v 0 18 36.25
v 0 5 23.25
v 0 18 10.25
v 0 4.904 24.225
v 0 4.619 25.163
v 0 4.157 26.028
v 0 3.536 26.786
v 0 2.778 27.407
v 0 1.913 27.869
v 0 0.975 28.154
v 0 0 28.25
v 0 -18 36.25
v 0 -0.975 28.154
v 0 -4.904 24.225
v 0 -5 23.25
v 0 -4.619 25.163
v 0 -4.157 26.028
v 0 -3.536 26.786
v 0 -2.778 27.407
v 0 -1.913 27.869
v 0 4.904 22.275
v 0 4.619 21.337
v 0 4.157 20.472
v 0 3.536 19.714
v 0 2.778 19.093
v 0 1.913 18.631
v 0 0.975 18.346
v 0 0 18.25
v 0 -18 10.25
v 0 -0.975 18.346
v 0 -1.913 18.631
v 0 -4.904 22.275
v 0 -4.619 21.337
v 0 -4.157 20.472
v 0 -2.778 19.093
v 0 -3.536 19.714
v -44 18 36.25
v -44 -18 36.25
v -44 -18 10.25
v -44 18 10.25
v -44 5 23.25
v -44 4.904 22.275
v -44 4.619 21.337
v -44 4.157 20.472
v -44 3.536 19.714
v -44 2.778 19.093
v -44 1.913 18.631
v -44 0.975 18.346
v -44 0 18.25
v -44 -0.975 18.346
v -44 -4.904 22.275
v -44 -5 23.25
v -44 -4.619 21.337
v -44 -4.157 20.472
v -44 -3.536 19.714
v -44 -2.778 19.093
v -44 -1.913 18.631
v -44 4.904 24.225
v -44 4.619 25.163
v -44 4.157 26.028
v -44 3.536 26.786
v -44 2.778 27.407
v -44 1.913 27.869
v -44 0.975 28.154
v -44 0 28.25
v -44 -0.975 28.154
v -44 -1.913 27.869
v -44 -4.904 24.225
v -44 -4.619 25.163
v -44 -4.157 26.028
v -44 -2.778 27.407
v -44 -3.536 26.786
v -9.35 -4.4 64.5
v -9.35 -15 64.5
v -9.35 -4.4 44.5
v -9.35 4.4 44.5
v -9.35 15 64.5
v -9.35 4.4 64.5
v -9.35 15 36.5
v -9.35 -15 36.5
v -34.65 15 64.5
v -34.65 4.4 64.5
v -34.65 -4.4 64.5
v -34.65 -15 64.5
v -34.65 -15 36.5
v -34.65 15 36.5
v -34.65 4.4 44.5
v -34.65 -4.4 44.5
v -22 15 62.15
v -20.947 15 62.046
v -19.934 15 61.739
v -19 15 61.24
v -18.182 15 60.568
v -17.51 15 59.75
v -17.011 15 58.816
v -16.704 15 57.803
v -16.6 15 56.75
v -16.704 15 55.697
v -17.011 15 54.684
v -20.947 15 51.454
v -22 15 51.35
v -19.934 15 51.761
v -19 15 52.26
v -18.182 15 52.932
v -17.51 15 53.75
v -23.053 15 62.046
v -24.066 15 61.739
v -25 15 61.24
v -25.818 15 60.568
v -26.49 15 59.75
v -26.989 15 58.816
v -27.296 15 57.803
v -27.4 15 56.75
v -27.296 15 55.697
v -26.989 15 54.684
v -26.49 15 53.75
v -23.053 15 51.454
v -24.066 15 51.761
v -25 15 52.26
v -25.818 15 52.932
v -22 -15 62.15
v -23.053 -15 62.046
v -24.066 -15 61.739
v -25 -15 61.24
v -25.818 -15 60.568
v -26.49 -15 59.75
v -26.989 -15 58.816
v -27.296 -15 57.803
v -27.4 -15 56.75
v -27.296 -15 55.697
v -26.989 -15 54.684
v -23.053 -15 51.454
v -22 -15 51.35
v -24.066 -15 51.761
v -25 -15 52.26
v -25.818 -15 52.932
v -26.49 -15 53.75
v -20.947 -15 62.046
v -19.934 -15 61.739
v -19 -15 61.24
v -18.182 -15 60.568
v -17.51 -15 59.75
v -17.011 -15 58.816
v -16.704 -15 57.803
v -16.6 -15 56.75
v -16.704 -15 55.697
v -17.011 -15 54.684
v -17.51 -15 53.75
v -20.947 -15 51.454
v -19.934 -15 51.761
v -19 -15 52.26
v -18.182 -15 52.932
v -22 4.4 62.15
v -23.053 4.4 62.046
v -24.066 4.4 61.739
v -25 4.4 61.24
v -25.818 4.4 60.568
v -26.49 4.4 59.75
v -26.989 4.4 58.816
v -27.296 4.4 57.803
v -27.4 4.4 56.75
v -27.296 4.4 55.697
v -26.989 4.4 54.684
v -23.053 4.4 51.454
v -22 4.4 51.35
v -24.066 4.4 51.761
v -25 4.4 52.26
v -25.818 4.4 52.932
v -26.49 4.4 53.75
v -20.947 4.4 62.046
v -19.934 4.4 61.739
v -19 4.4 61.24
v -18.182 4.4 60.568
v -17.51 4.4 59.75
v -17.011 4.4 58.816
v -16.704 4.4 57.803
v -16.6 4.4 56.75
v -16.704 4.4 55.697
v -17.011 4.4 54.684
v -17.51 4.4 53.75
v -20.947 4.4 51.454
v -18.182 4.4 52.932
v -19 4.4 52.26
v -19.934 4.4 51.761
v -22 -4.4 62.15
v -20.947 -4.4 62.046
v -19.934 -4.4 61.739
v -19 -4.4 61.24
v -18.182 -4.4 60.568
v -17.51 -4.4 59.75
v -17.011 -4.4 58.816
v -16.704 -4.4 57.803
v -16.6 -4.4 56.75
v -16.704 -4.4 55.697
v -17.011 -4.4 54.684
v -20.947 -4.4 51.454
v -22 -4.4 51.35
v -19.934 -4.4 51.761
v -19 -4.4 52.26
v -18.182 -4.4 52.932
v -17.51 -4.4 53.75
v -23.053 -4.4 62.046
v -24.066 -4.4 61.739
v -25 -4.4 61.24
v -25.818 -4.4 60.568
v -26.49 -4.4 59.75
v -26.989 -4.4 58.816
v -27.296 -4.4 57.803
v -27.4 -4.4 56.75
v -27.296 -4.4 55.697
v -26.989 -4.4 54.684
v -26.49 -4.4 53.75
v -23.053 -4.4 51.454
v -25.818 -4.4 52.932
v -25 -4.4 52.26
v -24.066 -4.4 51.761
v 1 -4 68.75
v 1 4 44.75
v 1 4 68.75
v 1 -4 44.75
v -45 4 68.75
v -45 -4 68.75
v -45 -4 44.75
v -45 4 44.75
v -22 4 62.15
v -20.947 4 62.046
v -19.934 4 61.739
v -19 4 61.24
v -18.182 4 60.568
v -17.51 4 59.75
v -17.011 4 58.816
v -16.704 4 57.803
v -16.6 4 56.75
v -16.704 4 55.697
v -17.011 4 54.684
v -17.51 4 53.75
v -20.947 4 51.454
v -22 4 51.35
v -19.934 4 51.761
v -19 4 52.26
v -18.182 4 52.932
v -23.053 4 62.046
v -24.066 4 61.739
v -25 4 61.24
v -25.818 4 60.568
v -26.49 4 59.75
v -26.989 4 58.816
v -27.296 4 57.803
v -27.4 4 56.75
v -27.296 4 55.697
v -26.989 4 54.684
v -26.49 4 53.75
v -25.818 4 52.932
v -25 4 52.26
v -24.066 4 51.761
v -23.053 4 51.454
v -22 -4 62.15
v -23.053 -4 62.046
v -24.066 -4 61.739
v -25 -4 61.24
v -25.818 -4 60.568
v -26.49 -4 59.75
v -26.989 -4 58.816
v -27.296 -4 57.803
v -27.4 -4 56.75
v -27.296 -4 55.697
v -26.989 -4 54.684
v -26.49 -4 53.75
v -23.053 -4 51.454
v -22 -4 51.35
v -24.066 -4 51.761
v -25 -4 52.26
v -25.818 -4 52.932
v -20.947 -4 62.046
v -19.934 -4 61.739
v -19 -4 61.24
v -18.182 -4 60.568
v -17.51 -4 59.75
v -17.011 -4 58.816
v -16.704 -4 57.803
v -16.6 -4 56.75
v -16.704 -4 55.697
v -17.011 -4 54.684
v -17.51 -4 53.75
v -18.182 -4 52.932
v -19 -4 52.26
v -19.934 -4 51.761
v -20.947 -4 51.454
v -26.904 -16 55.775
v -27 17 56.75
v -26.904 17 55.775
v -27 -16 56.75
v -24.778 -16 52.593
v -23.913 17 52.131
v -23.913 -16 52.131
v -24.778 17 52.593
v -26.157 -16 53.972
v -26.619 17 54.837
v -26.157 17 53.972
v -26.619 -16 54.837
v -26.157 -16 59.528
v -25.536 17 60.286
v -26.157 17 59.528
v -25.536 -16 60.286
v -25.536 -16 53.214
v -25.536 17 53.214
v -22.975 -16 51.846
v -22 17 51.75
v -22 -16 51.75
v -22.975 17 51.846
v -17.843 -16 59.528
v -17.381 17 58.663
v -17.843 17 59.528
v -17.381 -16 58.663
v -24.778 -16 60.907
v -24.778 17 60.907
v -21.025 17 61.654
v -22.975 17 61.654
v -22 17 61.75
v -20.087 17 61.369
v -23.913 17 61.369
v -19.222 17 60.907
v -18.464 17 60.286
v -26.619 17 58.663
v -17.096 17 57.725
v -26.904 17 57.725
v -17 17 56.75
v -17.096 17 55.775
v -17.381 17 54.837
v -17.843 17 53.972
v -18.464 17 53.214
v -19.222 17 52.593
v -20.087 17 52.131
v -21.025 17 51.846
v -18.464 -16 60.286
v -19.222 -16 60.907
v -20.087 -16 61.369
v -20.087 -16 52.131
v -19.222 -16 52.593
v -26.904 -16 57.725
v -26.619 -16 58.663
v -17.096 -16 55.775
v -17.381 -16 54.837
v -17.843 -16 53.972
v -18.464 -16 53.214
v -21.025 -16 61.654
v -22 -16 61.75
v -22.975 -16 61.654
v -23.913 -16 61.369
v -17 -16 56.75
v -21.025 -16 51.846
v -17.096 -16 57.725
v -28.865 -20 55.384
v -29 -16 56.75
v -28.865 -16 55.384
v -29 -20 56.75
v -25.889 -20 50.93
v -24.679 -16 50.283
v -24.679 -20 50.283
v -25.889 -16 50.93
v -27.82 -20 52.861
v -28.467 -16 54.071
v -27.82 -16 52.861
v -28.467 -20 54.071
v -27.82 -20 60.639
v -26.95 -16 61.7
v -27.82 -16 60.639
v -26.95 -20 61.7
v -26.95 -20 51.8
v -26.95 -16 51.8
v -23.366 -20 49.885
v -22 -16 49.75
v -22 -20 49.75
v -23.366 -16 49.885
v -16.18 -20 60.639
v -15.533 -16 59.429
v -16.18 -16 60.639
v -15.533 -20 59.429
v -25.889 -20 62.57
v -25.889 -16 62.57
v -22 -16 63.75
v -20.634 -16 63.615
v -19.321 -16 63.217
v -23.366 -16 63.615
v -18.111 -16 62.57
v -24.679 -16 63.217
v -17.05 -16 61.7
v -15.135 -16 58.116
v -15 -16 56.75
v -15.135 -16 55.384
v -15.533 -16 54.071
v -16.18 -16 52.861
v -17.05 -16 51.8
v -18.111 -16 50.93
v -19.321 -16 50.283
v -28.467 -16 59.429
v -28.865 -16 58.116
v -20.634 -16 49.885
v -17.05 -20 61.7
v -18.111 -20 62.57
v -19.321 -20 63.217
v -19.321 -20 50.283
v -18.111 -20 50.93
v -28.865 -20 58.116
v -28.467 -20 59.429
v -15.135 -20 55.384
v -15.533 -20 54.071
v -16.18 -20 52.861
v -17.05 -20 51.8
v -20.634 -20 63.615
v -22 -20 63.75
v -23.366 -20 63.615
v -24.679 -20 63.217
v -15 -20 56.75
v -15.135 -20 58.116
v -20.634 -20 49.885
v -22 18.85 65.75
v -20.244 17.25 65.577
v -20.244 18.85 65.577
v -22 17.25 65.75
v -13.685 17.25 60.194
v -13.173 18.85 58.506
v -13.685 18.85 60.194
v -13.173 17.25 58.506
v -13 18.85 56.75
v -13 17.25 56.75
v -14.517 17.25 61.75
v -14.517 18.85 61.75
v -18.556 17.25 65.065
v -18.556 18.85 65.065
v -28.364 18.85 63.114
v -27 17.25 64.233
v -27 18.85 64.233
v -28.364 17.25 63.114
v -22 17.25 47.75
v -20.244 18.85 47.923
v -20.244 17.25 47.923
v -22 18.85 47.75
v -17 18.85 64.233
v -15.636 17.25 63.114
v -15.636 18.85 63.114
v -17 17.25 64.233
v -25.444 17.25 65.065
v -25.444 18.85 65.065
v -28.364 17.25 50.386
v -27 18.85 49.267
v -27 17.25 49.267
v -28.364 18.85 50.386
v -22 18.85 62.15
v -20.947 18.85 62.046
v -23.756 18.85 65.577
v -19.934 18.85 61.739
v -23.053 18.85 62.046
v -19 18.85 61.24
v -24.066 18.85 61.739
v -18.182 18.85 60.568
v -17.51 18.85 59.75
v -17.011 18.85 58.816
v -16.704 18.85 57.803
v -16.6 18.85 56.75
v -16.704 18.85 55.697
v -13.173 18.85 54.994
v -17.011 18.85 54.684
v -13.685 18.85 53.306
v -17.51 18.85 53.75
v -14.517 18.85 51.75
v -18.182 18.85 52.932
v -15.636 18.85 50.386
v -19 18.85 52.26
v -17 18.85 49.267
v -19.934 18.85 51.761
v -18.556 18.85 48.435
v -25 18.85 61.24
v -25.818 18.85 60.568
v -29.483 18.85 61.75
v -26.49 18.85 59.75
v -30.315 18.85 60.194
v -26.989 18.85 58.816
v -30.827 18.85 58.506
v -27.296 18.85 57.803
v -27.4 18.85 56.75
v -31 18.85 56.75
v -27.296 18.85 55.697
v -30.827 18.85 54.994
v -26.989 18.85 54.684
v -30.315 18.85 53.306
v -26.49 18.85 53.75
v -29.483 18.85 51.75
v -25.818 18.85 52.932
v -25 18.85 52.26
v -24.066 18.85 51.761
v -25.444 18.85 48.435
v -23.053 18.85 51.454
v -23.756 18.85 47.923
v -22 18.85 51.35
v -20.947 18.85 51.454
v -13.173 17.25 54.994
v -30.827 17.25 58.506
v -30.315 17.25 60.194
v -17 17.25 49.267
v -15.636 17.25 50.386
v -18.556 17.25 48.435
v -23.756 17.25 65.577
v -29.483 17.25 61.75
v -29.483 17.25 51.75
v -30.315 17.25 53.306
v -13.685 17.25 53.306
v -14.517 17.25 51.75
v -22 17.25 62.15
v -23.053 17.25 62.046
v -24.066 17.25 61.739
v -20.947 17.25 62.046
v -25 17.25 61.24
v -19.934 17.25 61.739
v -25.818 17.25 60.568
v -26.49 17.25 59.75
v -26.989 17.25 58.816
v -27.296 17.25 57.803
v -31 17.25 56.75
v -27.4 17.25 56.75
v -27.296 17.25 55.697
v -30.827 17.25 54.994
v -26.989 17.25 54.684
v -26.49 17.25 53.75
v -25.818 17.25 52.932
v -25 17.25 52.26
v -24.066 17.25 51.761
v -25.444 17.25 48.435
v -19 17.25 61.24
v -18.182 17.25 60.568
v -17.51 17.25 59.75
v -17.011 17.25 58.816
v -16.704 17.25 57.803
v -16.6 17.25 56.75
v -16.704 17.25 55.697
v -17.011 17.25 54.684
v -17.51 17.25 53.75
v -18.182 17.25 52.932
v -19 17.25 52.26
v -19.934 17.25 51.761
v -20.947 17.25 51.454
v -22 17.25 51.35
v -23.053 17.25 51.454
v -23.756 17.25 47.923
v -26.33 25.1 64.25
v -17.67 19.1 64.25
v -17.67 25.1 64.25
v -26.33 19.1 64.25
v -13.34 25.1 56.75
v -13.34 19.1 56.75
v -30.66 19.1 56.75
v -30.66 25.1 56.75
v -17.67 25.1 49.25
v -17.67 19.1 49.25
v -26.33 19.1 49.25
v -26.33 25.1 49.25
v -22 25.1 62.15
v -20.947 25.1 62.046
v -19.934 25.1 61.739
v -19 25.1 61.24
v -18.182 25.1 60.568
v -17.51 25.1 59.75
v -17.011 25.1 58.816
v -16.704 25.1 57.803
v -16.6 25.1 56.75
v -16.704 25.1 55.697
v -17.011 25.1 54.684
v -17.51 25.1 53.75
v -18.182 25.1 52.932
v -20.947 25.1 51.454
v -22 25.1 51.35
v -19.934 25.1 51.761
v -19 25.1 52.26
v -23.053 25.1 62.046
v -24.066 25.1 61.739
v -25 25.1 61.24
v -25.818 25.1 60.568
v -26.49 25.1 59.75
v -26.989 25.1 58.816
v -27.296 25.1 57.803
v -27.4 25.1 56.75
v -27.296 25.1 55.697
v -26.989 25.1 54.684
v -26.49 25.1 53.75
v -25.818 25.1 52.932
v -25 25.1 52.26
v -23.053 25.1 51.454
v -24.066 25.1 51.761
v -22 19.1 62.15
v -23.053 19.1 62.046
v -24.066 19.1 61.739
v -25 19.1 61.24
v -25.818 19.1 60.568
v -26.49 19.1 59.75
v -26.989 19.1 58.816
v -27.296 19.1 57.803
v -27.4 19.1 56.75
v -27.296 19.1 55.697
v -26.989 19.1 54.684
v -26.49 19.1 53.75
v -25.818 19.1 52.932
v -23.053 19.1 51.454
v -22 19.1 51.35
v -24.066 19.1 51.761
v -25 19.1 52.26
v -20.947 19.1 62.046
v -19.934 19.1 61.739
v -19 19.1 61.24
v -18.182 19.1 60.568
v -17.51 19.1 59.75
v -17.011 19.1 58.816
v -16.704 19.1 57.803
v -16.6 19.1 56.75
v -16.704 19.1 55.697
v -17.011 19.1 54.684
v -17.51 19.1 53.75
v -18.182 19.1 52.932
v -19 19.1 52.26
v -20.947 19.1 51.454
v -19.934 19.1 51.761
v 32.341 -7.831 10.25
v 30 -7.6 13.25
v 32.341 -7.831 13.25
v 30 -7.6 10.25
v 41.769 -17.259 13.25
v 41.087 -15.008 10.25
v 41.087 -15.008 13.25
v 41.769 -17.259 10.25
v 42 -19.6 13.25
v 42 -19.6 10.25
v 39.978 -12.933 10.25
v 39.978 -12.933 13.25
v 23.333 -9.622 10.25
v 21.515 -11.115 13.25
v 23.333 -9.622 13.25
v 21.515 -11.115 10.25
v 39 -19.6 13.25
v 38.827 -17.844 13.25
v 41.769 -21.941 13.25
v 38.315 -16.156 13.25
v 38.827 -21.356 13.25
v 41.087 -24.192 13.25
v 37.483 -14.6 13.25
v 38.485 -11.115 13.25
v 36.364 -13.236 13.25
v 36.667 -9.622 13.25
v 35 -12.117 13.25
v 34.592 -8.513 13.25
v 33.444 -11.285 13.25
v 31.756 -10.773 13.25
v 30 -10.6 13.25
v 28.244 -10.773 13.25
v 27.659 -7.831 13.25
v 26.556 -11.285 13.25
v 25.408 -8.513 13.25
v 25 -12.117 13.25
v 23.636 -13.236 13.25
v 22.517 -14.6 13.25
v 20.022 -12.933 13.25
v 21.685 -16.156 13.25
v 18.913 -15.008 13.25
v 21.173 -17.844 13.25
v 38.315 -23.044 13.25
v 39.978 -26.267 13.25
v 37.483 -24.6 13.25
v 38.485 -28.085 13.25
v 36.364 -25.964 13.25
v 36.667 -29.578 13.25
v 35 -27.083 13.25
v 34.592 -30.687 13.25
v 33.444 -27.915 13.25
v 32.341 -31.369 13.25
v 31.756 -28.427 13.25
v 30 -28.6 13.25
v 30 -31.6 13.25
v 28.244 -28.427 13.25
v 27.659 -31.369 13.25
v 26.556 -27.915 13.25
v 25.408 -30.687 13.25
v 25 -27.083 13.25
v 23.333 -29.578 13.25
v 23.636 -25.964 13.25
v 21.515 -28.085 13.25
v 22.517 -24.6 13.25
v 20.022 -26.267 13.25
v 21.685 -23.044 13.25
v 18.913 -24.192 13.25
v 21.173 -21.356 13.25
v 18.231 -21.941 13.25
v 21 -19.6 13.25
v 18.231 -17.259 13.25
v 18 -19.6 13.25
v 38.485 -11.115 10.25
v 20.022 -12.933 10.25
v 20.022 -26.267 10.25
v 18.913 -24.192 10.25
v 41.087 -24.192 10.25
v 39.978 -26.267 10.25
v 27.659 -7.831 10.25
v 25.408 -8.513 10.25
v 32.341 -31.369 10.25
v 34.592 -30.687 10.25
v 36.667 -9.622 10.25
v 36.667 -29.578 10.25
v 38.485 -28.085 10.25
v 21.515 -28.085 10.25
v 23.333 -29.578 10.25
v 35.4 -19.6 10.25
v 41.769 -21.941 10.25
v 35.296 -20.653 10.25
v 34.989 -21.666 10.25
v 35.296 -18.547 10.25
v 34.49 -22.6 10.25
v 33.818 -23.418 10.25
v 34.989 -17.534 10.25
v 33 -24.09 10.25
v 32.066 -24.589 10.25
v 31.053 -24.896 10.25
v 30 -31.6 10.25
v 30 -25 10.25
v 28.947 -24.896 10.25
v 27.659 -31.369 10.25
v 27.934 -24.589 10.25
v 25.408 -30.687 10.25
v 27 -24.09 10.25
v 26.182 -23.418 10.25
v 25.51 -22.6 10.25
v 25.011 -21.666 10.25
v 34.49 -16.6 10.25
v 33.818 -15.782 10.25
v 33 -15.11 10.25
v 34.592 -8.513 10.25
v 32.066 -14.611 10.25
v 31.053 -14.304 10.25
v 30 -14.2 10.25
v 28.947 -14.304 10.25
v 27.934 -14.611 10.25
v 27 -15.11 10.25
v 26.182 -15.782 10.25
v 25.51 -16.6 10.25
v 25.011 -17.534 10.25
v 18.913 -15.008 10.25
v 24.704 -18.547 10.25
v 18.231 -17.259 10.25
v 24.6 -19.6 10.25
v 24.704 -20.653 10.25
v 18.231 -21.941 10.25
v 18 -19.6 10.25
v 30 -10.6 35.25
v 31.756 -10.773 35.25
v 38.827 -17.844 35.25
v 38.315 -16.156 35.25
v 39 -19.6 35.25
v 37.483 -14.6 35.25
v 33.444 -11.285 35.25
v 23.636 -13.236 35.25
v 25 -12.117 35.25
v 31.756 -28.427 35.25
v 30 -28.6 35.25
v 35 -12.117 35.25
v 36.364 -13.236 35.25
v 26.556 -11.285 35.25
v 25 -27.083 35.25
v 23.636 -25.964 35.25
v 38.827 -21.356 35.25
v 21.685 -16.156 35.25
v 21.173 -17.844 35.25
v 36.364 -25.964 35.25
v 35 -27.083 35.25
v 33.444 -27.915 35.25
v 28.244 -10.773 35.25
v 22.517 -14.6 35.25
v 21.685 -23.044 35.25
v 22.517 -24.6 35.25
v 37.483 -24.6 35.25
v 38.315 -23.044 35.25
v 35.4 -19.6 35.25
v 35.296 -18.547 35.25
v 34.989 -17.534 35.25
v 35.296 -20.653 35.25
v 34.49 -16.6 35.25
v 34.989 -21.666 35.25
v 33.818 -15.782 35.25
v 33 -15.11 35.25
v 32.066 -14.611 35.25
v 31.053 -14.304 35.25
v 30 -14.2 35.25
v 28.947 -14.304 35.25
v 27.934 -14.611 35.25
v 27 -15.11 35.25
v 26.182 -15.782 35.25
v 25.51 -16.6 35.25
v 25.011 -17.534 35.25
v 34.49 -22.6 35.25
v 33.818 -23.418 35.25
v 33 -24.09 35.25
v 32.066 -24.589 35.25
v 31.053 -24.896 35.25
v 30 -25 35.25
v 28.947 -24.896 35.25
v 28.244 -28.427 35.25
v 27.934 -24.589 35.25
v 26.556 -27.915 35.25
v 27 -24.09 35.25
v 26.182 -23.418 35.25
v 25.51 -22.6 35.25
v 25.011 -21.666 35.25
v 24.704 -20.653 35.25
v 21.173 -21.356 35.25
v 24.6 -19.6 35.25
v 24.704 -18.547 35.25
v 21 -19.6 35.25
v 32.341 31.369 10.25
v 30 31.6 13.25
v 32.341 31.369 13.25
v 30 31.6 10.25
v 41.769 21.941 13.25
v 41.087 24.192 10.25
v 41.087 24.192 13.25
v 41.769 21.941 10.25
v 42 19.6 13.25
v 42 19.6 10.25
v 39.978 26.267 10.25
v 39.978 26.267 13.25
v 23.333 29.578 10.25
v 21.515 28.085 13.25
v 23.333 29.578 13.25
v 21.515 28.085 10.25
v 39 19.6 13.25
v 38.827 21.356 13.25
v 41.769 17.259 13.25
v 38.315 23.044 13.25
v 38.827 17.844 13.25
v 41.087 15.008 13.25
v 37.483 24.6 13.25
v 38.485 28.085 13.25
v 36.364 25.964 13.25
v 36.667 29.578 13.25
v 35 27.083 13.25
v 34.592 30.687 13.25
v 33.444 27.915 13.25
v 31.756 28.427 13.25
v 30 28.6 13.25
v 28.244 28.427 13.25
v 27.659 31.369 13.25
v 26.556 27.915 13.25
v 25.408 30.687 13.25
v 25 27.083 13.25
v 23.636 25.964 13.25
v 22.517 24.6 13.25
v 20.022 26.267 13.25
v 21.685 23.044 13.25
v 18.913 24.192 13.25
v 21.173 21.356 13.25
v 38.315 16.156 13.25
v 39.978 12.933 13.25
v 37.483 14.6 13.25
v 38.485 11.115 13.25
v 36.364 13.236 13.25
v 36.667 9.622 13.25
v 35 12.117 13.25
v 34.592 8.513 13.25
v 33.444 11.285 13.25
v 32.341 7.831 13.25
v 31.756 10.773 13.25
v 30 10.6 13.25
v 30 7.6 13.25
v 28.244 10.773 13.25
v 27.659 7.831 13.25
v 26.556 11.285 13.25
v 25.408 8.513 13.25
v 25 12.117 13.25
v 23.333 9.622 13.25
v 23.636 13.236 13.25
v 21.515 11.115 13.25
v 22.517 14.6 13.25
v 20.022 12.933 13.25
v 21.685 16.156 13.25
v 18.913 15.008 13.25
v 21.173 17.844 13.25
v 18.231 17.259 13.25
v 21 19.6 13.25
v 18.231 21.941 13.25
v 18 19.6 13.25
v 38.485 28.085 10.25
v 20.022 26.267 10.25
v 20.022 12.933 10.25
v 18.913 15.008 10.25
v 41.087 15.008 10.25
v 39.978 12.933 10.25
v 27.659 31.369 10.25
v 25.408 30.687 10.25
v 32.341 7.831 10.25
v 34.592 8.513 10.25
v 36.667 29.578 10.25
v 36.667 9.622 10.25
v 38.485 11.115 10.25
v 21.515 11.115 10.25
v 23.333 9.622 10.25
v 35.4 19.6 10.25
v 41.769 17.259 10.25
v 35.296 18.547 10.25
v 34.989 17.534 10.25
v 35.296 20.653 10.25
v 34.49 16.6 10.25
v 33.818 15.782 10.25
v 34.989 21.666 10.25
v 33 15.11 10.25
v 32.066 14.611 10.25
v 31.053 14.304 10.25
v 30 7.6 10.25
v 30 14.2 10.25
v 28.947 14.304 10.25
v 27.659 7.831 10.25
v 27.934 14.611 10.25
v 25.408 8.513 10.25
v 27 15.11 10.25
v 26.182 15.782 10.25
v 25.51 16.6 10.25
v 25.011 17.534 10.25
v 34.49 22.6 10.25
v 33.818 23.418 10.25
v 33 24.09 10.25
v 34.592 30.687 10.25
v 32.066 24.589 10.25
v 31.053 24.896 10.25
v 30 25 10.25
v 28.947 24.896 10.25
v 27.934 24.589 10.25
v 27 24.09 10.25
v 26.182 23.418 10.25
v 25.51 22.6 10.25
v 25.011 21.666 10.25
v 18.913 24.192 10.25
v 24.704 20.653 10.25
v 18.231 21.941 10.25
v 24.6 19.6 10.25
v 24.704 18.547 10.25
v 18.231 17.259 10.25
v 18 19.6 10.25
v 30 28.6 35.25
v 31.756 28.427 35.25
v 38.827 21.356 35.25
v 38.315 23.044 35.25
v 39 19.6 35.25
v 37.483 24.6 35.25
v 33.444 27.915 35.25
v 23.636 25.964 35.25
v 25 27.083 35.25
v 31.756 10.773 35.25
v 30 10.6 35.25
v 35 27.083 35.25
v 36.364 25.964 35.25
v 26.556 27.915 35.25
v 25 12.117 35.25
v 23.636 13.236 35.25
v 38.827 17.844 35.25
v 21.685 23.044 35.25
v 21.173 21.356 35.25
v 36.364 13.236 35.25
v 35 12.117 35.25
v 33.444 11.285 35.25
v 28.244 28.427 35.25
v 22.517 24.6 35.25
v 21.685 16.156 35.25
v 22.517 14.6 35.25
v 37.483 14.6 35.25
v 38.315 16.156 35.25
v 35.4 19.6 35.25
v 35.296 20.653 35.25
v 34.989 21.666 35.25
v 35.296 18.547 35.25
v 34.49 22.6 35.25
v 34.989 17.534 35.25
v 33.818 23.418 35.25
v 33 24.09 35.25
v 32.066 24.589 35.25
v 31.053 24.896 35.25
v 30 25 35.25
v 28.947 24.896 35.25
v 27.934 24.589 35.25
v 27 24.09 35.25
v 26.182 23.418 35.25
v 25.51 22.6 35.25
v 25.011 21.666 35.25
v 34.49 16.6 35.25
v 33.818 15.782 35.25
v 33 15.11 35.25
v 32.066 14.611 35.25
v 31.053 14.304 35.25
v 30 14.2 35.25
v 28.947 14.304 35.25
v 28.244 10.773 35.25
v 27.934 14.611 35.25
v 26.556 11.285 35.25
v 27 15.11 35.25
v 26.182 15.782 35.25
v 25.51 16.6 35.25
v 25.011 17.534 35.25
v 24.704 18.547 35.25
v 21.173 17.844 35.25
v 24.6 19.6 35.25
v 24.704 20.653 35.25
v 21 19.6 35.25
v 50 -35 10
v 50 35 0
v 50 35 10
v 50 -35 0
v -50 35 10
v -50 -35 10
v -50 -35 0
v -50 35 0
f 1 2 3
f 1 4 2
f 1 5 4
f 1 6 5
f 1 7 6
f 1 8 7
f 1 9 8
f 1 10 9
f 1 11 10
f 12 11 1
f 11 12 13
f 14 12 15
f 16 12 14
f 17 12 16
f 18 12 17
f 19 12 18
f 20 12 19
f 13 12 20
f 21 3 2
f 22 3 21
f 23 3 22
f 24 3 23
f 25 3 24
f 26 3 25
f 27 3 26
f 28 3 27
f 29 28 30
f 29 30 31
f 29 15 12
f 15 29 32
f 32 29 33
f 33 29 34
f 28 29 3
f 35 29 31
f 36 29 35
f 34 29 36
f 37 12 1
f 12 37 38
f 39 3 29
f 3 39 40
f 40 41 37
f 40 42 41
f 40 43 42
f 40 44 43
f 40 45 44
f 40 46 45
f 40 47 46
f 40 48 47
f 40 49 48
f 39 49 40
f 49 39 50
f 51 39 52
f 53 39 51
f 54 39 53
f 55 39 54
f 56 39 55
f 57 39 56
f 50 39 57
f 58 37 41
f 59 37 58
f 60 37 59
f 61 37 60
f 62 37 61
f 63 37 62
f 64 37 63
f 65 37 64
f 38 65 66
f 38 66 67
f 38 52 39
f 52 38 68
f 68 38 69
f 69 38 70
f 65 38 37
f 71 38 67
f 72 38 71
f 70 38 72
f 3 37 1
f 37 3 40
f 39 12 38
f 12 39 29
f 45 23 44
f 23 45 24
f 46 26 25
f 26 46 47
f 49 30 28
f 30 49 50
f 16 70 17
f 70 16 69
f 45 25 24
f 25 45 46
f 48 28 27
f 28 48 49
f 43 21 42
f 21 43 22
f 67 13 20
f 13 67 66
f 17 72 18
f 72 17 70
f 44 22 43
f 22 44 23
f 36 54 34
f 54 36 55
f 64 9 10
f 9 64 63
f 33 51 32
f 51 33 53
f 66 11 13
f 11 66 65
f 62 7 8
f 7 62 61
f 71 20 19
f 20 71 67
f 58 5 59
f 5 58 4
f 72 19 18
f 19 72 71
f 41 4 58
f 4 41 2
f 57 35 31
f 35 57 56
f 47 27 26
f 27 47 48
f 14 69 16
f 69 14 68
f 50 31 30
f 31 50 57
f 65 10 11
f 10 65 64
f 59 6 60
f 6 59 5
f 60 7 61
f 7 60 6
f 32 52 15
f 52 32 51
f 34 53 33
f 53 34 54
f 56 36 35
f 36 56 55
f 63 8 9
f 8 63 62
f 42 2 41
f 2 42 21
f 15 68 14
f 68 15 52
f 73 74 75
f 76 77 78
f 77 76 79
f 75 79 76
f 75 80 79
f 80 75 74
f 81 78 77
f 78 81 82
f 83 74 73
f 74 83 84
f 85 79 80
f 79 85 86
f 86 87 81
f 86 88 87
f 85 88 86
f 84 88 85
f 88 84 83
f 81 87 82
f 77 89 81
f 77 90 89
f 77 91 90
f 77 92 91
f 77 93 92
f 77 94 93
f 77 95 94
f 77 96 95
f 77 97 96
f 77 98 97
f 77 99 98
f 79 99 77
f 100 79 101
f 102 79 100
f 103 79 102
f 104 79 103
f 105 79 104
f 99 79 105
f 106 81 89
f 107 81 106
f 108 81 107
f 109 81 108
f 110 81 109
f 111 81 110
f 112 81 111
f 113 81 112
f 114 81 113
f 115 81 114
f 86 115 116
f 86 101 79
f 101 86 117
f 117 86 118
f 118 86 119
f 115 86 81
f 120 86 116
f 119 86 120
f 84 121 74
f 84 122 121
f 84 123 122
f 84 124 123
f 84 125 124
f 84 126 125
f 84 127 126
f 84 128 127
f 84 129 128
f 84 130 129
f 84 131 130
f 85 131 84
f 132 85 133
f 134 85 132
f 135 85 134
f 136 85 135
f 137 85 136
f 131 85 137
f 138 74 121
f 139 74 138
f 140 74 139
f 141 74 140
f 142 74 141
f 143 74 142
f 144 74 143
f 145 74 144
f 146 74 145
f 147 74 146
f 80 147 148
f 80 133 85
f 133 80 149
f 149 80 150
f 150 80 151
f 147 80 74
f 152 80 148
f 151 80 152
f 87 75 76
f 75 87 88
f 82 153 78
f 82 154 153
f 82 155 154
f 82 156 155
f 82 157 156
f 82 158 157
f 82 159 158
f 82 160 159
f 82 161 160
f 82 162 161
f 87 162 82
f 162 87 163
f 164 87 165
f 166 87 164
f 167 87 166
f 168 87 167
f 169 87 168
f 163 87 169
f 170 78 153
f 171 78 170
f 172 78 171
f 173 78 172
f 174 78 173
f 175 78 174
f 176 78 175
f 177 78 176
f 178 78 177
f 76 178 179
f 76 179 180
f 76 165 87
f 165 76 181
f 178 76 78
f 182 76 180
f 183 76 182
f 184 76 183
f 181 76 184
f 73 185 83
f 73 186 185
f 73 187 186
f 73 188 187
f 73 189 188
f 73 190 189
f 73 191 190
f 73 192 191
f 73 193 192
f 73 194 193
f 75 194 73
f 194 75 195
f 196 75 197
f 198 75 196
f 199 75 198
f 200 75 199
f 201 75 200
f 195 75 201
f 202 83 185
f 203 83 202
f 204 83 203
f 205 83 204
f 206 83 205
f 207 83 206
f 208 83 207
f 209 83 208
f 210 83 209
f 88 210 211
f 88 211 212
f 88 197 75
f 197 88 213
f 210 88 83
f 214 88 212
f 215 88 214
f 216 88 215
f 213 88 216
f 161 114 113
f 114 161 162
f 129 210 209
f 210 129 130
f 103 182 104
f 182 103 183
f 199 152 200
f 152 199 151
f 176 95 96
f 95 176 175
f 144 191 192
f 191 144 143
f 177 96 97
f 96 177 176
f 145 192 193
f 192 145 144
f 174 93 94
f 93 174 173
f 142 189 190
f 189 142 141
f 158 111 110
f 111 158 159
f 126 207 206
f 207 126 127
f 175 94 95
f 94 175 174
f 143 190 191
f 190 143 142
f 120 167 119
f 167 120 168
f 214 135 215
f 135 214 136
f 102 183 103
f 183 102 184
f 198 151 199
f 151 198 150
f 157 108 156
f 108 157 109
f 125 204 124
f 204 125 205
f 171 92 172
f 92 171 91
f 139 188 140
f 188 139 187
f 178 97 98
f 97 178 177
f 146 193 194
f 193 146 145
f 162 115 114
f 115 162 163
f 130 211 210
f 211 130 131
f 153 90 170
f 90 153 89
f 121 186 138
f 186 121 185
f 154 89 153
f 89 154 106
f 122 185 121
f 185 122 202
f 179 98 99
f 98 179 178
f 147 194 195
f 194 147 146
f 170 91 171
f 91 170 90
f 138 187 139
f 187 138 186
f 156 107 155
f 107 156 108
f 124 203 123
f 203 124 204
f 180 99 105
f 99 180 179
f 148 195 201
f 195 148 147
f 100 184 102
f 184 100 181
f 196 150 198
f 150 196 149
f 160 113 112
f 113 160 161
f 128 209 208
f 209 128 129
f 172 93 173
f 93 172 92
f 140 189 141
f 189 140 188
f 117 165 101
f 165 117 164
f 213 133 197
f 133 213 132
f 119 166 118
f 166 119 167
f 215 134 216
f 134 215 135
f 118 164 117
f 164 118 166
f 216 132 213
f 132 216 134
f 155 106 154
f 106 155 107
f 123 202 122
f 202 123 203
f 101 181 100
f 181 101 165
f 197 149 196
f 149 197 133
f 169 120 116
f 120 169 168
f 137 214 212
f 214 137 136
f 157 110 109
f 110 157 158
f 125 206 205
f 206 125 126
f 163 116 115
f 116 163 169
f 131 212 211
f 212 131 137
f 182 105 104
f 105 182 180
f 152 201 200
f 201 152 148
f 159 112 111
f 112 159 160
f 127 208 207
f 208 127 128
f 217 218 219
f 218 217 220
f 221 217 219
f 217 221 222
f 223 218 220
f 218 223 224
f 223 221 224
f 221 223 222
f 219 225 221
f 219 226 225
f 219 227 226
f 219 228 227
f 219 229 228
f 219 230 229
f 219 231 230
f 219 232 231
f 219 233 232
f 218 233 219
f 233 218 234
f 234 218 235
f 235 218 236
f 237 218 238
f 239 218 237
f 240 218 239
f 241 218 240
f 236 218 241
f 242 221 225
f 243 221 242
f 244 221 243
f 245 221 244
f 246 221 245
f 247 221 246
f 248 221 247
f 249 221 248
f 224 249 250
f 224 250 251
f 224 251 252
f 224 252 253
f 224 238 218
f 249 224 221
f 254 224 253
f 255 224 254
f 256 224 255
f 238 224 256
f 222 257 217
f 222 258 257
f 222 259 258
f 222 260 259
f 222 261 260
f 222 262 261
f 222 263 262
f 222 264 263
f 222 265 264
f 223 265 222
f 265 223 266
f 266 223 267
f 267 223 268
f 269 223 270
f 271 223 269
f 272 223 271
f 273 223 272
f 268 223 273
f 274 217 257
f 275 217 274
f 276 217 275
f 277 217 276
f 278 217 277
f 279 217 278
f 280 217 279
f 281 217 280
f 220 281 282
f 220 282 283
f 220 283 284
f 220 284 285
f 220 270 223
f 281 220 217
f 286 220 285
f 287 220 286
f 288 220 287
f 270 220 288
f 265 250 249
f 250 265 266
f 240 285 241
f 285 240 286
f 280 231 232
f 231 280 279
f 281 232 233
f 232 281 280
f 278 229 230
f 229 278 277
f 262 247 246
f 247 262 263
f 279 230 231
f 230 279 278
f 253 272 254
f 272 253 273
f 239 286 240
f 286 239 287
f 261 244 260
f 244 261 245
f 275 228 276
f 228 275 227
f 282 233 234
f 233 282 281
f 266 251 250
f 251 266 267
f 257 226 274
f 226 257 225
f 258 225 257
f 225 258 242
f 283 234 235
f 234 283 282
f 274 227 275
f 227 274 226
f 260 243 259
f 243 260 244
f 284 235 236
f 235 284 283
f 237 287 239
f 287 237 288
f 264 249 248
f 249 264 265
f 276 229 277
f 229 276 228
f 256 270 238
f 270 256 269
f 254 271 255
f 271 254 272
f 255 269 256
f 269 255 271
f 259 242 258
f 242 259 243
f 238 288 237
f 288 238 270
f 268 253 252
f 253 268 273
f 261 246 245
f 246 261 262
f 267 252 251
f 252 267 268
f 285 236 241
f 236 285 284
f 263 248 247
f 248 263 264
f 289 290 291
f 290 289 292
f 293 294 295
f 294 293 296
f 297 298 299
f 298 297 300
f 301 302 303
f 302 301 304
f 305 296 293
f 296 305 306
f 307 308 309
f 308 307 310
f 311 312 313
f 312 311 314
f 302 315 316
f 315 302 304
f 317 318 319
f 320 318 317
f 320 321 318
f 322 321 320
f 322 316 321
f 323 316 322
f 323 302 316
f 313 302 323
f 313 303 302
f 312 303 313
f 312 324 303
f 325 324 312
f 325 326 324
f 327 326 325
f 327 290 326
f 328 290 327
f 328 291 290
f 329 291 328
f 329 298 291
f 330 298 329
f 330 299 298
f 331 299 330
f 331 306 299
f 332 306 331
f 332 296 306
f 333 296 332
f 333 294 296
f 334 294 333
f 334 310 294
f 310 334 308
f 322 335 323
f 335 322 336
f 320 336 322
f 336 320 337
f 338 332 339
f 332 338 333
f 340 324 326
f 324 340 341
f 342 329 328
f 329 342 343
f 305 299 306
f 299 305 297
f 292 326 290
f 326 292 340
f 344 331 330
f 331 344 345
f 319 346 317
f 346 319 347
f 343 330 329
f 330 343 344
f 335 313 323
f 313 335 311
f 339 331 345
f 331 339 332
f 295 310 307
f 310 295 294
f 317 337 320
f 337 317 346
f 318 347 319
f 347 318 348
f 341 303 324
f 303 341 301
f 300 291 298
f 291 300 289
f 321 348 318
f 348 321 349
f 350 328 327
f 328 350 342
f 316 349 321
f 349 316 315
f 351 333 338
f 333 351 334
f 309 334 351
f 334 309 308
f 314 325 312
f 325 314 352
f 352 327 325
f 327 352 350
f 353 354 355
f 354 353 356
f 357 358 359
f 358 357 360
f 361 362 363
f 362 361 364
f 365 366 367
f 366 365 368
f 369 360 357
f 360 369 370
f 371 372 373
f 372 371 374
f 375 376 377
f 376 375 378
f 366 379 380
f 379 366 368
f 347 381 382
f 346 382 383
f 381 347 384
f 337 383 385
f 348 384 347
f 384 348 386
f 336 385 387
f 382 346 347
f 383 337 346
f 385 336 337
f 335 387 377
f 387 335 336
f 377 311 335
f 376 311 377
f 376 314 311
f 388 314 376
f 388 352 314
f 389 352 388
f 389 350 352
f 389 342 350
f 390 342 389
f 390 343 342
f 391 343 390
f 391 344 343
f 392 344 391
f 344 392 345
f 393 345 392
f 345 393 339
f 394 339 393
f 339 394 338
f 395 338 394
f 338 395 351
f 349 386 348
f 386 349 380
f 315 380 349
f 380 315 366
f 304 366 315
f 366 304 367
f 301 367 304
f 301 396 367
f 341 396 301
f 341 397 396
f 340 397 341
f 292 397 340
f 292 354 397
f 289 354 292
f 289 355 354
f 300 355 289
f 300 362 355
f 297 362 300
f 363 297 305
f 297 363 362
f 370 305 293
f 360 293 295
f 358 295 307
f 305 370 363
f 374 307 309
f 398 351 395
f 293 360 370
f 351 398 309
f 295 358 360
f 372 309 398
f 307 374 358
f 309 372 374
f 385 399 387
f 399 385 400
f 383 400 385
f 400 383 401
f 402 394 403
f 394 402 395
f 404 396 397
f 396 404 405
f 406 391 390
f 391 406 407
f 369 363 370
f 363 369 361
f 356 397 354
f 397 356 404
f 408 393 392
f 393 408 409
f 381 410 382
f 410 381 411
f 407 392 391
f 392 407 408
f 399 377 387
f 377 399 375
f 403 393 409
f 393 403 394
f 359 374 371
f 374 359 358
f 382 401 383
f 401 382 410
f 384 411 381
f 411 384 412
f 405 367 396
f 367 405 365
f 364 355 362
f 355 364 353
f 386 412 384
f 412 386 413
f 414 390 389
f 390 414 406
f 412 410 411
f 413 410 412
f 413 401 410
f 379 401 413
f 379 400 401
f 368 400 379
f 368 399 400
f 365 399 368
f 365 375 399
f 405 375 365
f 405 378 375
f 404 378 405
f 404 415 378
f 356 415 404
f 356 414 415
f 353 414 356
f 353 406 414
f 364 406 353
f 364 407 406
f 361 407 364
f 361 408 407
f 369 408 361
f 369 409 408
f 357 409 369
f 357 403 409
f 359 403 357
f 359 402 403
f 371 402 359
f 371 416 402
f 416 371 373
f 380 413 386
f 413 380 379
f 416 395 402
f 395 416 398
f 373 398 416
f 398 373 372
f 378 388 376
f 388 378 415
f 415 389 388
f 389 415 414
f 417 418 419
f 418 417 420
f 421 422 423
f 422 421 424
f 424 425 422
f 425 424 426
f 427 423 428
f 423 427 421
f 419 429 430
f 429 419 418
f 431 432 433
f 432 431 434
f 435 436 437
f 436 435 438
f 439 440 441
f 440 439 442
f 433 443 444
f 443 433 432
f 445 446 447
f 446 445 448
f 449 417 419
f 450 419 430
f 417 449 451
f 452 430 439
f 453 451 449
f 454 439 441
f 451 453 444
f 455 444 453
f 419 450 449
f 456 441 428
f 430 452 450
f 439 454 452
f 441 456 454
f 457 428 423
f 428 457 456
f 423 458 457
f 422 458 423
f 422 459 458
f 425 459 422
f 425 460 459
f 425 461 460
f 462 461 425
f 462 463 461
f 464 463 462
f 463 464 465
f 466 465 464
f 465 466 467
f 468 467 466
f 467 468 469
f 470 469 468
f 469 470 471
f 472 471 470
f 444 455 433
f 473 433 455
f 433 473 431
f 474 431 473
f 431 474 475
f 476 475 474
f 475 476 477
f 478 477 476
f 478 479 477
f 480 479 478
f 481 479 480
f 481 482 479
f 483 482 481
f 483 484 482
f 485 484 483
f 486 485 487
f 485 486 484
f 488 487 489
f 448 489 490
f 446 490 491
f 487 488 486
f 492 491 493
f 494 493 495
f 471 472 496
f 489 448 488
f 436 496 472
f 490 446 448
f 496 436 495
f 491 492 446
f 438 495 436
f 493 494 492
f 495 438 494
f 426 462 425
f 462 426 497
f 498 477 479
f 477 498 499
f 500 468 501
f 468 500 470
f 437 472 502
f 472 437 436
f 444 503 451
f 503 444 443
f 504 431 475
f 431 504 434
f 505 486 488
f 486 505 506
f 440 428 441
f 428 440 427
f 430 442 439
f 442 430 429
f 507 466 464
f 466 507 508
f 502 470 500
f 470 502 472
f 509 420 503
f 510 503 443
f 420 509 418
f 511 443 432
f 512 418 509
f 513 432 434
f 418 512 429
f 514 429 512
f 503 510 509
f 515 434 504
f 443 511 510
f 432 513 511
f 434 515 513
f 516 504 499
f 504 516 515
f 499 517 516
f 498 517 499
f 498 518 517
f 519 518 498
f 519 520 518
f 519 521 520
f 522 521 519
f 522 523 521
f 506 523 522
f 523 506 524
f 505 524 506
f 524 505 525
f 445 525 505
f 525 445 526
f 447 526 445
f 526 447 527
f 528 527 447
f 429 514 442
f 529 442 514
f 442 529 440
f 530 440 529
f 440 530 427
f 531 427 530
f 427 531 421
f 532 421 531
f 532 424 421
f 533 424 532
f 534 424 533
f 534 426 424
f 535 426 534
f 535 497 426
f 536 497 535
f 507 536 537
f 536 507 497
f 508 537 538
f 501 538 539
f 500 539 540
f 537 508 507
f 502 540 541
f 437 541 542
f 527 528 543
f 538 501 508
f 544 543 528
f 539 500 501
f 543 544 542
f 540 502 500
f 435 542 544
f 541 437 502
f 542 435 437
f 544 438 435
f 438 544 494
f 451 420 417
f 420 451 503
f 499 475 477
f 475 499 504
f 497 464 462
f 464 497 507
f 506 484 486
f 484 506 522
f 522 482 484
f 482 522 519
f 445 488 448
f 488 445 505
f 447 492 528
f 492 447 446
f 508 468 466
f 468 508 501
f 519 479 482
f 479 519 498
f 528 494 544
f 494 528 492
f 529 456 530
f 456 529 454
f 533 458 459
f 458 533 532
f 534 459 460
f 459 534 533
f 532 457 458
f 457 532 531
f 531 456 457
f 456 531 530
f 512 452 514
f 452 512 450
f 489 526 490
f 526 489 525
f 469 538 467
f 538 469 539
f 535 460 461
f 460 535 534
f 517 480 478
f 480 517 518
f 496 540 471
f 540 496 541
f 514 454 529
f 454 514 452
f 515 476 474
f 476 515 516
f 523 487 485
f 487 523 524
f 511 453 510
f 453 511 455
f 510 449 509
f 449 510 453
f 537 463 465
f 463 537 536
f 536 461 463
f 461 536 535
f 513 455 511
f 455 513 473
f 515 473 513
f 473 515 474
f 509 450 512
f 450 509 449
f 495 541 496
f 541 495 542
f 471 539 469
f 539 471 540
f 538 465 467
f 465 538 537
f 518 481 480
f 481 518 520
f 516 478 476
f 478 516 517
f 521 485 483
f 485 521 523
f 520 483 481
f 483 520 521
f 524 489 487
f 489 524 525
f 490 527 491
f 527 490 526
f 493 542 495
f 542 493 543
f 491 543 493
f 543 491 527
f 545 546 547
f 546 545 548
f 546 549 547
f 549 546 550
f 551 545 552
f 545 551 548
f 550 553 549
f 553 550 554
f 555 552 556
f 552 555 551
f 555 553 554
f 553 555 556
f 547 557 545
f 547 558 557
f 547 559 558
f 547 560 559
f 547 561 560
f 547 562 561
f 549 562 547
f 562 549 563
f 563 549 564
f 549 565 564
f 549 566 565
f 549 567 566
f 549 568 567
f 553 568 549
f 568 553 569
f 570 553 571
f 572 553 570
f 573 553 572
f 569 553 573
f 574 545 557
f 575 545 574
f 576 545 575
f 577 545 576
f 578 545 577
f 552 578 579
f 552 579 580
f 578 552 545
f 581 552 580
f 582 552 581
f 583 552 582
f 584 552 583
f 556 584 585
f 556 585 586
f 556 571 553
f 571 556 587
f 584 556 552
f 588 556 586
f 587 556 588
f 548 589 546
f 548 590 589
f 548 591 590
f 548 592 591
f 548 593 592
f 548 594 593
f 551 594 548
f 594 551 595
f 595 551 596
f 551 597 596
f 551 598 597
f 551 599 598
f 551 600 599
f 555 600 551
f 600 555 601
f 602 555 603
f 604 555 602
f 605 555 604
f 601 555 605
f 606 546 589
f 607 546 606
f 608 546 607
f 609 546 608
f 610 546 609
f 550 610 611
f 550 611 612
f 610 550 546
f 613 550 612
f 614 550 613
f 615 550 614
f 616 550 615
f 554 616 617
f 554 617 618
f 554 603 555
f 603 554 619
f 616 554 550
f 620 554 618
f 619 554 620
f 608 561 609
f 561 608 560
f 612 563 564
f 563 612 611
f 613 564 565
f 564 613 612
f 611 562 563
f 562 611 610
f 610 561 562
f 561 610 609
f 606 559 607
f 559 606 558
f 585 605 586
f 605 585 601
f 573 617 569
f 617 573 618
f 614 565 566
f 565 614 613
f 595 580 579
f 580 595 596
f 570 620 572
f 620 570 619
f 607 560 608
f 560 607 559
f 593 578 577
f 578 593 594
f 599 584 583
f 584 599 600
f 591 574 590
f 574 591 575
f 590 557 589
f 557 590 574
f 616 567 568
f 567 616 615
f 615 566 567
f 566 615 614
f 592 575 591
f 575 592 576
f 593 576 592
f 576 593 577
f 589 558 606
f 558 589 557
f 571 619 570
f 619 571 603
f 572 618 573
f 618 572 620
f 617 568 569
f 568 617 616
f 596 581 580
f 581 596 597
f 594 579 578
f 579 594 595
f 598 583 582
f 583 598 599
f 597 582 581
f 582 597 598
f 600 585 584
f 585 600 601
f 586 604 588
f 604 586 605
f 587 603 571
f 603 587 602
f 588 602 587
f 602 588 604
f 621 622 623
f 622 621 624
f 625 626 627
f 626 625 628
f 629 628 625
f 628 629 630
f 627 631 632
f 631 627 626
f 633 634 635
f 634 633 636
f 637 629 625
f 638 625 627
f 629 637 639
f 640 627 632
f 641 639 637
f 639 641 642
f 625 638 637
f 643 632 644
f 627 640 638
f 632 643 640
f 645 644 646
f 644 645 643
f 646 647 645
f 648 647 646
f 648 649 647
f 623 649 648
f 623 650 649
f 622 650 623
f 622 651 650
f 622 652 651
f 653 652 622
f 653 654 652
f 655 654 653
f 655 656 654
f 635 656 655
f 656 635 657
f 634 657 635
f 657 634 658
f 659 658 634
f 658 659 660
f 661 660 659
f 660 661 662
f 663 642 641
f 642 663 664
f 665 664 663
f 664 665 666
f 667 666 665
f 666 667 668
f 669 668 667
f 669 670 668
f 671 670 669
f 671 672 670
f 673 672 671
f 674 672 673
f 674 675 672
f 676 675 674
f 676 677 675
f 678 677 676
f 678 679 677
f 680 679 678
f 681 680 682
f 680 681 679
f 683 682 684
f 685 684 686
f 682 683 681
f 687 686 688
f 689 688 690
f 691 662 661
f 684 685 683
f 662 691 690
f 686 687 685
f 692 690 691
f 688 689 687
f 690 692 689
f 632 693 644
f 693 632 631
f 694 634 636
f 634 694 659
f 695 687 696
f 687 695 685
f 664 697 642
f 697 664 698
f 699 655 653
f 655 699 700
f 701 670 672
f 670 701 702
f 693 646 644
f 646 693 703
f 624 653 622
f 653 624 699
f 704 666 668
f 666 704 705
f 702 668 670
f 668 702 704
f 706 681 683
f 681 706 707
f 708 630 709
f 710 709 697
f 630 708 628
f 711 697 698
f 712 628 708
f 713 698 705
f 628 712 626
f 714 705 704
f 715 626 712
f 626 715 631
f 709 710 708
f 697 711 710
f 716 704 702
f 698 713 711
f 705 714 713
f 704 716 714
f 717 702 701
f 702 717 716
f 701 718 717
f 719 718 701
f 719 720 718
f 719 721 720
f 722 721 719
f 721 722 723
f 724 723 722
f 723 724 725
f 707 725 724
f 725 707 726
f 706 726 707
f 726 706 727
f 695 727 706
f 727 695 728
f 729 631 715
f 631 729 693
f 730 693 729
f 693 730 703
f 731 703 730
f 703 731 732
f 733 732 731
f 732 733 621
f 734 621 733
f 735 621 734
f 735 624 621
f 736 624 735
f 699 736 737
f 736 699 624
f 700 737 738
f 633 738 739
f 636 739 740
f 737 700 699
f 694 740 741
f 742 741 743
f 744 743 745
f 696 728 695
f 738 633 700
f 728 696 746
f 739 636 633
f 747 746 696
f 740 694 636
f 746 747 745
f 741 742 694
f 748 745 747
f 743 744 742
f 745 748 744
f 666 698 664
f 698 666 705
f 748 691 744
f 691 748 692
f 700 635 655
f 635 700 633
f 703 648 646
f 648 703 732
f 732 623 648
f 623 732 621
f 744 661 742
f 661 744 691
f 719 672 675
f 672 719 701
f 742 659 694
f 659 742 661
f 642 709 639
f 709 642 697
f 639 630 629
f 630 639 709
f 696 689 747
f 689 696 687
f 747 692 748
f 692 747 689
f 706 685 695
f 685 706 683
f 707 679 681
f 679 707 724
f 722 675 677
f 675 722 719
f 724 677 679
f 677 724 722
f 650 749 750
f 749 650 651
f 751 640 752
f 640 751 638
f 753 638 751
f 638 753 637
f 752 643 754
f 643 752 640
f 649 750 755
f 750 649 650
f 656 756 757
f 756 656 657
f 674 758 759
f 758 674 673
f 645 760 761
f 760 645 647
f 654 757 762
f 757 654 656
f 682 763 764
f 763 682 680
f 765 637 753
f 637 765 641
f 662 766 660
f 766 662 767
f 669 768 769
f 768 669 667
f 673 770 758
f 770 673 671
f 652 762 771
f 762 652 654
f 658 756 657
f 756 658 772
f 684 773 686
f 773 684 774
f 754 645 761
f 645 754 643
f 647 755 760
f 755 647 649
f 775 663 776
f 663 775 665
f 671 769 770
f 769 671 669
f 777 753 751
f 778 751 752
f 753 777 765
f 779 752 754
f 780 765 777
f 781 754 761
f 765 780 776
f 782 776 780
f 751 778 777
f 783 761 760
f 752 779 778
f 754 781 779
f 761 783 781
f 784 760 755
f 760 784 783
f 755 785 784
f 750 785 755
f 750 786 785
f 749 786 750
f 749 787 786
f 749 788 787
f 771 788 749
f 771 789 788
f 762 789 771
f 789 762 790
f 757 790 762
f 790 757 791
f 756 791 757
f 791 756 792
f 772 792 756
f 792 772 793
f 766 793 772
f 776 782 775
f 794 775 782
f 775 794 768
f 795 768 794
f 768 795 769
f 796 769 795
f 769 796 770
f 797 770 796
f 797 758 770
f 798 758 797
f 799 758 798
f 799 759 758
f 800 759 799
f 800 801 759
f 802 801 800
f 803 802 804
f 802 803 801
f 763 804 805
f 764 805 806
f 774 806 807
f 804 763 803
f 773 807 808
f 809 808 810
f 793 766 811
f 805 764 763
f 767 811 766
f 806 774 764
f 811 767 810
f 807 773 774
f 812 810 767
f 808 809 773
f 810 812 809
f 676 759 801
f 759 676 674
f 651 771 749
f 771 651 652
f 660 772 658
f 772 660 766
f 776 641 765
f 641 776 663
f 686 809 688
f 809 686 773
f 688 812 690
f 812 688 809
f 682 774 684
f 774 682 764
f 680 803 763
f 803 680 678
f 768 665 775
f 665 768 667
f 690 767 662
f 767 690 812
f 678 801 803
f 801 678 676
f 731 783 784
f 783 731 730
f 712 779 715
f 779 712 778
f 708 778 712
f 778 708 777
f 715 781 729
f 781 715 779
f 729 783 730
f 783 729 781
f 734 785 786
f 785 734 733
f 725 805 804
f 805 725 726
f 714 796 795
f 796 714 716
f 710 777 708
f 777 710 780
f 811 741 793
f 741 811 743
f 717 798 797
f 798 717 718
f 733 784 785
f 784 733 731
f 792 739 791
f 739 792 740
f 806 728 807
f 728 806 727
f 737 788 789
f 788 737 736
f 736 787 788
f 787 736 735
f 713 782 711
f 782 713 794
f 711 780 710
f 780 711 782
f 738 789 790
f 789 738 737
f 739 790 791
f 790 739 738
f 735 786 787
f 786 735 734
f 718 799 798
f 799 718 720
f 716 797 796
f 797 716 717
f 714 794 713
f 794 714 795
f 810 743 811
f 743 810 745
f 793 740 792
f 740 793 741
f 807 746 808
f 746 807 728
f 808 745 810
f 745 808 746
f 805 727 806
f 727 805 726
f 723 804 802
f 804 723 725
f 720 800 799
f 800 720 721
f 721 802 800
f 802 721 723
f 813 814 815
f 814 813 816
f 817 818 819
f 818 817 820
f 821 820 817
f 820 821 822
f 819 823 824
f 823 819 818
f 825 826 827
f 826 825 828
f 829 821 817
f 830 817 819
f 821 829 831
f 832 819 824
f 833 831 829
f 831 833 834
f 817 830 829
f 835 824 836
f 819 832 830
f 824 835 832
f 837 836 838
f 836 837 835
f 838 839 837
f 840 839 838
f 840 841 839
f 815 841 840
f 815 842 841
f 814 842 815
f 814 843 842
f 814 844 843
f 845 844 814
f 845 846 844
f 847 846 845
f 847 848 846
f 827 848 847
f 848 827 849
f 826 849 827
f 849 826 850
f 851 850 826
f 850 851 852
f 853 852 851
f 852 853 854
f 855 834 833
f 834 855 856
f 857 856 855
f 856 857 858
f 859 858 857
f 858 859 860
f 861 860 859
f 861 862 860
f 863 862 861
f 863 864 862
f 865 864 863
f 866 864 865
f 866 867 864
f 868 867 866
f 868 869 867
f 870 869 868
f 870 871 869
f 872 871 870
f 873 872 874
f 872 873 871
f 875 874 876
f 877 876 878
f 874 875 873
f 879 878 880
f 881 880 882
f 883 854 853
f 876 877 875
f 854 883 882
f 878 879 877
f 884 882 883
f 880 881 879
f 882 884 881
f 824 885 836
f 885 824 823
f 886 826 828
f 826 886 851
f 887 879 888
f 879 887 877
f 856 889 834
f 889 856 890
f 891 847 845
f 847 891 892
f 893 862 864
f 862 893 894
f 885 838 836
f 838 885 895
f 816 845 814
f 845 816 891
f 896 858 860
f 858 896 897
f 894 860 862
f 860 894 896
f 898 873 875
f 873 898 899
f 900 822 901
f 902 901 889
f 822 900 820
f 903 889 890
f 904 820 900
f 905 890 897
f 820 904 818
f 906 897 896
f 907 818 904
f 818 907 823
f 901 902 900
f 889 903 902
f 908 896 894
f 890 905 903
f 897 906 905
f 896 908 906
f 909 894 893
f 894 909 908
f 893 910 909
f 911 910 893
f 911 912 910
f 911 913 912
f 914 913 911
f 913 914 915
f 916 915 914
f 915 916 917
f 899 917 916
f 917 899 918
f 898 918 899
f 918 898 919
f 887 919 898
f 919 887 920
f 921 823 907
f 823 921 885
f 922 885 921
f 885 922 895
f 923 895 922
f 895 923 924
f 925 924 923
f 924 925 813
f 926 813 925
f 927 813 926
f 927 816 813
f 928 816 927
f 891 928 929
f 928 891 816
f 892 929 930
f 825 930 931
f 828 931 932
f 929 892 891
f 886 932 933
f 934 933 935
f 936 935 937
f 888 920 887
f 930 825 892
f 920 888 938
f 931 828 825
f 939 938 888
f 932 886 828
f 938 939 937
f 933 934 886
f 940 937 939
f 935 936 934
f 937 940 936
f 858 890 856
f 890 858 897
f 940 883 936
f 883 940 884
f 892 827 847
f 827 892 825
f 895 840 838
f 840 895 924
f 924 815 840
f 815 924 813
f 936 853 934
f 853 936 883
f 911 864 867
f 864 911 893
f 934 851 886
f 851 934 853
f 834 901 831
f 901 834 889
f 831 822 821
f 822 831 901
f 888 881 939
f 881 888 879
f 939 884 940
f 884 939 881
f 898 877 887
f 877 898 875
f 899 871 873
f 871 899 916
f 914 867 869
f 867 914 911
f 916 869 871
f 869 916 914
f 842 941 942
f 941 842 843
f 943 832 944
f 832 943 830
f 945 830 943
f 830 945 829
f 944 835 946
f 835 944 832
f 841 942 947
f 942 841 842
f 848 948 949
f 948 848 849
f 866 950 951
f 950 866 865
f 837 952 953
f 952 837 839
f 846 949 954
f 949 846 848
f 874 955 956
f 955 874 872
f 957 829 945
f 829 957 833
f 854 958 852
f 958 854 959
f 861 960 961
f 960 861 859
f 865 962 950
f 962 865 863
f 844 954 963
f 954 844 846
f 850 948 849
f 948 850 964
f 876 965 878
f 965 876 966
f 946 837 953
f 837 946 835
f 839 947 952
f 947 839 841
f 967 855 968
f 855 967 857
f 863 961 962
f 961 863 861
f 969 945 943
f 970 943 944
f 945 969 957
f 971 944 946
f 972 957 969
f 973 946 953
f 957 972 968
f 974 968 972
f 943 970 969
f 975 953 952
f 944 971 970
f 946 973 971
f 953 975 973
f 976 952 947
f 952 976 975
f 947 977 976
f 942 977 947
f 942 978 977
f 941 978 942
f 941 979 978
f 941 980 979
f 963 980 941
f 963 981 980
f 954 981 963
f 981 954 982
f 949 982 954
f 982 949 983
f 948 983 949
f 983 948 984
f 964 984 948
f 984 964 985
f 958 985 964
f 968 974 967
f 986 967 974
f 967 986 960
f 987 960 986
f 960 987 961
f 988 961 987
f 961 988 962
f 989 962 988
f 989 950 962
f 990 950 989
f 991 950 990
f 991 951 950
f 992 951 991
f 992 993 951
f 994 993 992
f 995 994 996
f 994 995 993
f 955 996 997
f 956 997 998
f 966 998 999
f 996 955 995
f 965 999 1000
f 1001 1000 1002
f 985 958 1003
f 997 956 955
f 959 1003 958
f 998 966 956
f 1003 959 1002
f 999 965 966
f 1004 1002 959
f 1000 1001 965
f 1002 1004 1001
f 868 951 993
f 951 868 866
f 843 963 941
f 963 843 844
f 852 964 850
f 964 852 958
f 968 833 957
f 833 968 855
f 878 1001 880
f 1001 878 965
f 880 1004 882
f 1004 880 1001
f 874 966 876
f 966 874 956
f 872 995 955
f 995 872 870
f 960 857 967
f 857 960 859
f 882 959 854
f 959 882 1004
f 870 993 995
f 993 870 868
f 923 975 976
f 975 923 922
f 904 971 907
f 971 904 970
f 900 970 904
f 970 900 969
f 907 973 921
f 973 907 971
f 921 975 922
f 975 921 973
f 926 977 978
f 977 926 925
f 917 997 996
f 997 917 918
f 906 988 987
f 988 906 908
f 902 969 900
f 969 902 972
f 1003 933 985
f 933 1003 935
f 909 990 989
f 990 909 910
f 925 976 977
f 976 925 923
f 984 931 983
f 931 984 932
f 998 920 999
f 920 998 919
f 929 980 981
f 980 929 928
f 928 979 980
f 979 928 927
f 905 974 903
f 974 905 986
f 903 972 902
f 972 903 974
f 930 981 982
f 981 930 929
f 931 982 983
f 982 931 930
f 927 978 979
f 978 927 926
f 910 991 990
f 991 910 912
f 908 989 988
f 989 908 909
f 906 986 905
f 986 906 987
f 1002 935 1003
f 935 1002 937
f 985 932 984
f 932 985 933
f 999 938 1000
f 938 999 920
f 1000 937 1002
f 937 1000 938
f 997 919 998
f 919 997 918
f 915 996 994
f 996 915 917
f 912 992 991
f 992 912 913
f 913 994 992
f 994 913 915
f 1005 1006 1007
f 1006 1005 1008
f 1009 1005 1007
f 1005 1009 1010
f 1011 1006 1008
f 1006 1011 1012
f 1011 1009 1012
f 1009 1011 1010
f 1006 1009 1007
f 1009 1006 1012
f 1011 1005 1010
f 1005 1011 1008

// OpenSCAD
$fn = 32;

// ------------------------------------------------------------------------
// Indexing jig: plate 100 x 70 mm, pin d10
// Every part is its own module, assembly() places every instance.
// ------------------------------------------------------------------------

// --- part 1 ---
module jig_plate() {
  difference() {
    translate([-50, -35, 0]) cube([100, 70, 10]);
  }
}

// --- part 2 ---
module locator_block() {
  difference() {
    translate([-22, -18, 0]) cube([44, 36, 26]);
    translate([0, 0, 13]) rotate([0, 90, 0]) cylinder(h = 46, d = 10, center = true);
  }
}

// --- part 3 ---
module index_fork() {
  difference() {
    translate([-12.65, -15, 0]) cube([25.3, 30, 28]);
    translate([-13.65, -4.4, 8]) cube([27.3, 8.8, 21]);
    translate([0, 0, 20.25]) rotate([90, 0, 0]) cylinder(h = 32, d = 10.8, center = true);
  }
}

// --- part 4 ---
module index_arm() {
  difference() {
    translate([-23, -4, 0]) cube([46, 8, 24]);
    translate([0, 0, 12]) rotate([90, 0, 0]) cylinder(h = 10, d = 10.8, center = true);
  }
}

// --- part 5 ---
module index_pin() {
  rotate([0, 90, 0]) cylinder(h = 34, d = 10, center = true);
  translate([-20, 0, 0]) rotate([0, 90, 0]) cylinder(h = 4, d = 14);
}

// --- part 6 ---
module pin_washer() {
  difference() {
      translate([0, 0, 0]) cylinder(h = 1.6, d = 18);
      translate([0, 0, -1]) cylinder(h = 3.6, d = 10.8);
    }
}

// --- part 7 ---
module lock_nut() {
  difference() {
    linear_extrude(height = 6) polygon(points = [[8.66, 0], [4.33, 7.5], [-4.33, 7.5], [-8.66, 0], [-4.33, -7.5], [4.33, -7.5]]);
    translate([0, 0, -1]) cylinder(h = 8, d = 10.8);
  }
}

// --- part 8 ---
module guide_bush_a() {
  difference() {
    union() {
      cylinder(h = 3, d = 24);
      translate([0, 0, 3]) cylinder(h = 22, d = 18);
    }
    translate([0, 0, -1]) cylinder(h = 27, d = 10.8);
  }
}

// --- part 9 ---
module guide_bush_b() {
  difference() {
    union() {
      cylinder(h = 3, d = 24);
      translate([0, 0, 3]) cylinder(h = 22, d = 18);
    }
    translate([0, 0, -1]) cylinder(h = 27, d = 10.8);
  }
}

// --- assembly ---
module assembly() {
  color([0.80, 0.24, 0.20]) translate([0, 0, 0]) rotate([0, 0, 0]) jig_plate();
  color([0.20, 0.45, 0.75]) translate([-22, 0, 10.25]) rotate([0, 0, 0]) locator_block();
  color([0.25, 0.62, 0.32]) translate([-22, 0, 36.5]) rotate([0, 0, 0]) index_fork();
  color([0.92, 0.70, 0.18]) translate([-22, 0, 44.75]) rotate([0, 0, 0]) index_arm();
  color([0.58, 0.35, 0.70]) translate([-22, 0, 56.75]) rotate([0, 0, 90]) index_pin();
  color([0.16, 0.66, 0.66]) translate([-22, 18.85, 56.75]) rotate([90, 0, 0]) pin_washer();
  color([0.85, 0.48, 0.18]) translate([-22, 25.1, 56.75]) rotate([90, 0, 0]) lock_nut();
  color([0.55, 0.60, 0.65]) translate([30, -19.6, 10.25]) rotate([0, 0, 0]) guide_bush_a();
  color([0.75, 0.30, 0.55]) translate([30, 19.6, 10.25]) rotate([0, 0, 0]) guide_bush_b();
}

assembly();
